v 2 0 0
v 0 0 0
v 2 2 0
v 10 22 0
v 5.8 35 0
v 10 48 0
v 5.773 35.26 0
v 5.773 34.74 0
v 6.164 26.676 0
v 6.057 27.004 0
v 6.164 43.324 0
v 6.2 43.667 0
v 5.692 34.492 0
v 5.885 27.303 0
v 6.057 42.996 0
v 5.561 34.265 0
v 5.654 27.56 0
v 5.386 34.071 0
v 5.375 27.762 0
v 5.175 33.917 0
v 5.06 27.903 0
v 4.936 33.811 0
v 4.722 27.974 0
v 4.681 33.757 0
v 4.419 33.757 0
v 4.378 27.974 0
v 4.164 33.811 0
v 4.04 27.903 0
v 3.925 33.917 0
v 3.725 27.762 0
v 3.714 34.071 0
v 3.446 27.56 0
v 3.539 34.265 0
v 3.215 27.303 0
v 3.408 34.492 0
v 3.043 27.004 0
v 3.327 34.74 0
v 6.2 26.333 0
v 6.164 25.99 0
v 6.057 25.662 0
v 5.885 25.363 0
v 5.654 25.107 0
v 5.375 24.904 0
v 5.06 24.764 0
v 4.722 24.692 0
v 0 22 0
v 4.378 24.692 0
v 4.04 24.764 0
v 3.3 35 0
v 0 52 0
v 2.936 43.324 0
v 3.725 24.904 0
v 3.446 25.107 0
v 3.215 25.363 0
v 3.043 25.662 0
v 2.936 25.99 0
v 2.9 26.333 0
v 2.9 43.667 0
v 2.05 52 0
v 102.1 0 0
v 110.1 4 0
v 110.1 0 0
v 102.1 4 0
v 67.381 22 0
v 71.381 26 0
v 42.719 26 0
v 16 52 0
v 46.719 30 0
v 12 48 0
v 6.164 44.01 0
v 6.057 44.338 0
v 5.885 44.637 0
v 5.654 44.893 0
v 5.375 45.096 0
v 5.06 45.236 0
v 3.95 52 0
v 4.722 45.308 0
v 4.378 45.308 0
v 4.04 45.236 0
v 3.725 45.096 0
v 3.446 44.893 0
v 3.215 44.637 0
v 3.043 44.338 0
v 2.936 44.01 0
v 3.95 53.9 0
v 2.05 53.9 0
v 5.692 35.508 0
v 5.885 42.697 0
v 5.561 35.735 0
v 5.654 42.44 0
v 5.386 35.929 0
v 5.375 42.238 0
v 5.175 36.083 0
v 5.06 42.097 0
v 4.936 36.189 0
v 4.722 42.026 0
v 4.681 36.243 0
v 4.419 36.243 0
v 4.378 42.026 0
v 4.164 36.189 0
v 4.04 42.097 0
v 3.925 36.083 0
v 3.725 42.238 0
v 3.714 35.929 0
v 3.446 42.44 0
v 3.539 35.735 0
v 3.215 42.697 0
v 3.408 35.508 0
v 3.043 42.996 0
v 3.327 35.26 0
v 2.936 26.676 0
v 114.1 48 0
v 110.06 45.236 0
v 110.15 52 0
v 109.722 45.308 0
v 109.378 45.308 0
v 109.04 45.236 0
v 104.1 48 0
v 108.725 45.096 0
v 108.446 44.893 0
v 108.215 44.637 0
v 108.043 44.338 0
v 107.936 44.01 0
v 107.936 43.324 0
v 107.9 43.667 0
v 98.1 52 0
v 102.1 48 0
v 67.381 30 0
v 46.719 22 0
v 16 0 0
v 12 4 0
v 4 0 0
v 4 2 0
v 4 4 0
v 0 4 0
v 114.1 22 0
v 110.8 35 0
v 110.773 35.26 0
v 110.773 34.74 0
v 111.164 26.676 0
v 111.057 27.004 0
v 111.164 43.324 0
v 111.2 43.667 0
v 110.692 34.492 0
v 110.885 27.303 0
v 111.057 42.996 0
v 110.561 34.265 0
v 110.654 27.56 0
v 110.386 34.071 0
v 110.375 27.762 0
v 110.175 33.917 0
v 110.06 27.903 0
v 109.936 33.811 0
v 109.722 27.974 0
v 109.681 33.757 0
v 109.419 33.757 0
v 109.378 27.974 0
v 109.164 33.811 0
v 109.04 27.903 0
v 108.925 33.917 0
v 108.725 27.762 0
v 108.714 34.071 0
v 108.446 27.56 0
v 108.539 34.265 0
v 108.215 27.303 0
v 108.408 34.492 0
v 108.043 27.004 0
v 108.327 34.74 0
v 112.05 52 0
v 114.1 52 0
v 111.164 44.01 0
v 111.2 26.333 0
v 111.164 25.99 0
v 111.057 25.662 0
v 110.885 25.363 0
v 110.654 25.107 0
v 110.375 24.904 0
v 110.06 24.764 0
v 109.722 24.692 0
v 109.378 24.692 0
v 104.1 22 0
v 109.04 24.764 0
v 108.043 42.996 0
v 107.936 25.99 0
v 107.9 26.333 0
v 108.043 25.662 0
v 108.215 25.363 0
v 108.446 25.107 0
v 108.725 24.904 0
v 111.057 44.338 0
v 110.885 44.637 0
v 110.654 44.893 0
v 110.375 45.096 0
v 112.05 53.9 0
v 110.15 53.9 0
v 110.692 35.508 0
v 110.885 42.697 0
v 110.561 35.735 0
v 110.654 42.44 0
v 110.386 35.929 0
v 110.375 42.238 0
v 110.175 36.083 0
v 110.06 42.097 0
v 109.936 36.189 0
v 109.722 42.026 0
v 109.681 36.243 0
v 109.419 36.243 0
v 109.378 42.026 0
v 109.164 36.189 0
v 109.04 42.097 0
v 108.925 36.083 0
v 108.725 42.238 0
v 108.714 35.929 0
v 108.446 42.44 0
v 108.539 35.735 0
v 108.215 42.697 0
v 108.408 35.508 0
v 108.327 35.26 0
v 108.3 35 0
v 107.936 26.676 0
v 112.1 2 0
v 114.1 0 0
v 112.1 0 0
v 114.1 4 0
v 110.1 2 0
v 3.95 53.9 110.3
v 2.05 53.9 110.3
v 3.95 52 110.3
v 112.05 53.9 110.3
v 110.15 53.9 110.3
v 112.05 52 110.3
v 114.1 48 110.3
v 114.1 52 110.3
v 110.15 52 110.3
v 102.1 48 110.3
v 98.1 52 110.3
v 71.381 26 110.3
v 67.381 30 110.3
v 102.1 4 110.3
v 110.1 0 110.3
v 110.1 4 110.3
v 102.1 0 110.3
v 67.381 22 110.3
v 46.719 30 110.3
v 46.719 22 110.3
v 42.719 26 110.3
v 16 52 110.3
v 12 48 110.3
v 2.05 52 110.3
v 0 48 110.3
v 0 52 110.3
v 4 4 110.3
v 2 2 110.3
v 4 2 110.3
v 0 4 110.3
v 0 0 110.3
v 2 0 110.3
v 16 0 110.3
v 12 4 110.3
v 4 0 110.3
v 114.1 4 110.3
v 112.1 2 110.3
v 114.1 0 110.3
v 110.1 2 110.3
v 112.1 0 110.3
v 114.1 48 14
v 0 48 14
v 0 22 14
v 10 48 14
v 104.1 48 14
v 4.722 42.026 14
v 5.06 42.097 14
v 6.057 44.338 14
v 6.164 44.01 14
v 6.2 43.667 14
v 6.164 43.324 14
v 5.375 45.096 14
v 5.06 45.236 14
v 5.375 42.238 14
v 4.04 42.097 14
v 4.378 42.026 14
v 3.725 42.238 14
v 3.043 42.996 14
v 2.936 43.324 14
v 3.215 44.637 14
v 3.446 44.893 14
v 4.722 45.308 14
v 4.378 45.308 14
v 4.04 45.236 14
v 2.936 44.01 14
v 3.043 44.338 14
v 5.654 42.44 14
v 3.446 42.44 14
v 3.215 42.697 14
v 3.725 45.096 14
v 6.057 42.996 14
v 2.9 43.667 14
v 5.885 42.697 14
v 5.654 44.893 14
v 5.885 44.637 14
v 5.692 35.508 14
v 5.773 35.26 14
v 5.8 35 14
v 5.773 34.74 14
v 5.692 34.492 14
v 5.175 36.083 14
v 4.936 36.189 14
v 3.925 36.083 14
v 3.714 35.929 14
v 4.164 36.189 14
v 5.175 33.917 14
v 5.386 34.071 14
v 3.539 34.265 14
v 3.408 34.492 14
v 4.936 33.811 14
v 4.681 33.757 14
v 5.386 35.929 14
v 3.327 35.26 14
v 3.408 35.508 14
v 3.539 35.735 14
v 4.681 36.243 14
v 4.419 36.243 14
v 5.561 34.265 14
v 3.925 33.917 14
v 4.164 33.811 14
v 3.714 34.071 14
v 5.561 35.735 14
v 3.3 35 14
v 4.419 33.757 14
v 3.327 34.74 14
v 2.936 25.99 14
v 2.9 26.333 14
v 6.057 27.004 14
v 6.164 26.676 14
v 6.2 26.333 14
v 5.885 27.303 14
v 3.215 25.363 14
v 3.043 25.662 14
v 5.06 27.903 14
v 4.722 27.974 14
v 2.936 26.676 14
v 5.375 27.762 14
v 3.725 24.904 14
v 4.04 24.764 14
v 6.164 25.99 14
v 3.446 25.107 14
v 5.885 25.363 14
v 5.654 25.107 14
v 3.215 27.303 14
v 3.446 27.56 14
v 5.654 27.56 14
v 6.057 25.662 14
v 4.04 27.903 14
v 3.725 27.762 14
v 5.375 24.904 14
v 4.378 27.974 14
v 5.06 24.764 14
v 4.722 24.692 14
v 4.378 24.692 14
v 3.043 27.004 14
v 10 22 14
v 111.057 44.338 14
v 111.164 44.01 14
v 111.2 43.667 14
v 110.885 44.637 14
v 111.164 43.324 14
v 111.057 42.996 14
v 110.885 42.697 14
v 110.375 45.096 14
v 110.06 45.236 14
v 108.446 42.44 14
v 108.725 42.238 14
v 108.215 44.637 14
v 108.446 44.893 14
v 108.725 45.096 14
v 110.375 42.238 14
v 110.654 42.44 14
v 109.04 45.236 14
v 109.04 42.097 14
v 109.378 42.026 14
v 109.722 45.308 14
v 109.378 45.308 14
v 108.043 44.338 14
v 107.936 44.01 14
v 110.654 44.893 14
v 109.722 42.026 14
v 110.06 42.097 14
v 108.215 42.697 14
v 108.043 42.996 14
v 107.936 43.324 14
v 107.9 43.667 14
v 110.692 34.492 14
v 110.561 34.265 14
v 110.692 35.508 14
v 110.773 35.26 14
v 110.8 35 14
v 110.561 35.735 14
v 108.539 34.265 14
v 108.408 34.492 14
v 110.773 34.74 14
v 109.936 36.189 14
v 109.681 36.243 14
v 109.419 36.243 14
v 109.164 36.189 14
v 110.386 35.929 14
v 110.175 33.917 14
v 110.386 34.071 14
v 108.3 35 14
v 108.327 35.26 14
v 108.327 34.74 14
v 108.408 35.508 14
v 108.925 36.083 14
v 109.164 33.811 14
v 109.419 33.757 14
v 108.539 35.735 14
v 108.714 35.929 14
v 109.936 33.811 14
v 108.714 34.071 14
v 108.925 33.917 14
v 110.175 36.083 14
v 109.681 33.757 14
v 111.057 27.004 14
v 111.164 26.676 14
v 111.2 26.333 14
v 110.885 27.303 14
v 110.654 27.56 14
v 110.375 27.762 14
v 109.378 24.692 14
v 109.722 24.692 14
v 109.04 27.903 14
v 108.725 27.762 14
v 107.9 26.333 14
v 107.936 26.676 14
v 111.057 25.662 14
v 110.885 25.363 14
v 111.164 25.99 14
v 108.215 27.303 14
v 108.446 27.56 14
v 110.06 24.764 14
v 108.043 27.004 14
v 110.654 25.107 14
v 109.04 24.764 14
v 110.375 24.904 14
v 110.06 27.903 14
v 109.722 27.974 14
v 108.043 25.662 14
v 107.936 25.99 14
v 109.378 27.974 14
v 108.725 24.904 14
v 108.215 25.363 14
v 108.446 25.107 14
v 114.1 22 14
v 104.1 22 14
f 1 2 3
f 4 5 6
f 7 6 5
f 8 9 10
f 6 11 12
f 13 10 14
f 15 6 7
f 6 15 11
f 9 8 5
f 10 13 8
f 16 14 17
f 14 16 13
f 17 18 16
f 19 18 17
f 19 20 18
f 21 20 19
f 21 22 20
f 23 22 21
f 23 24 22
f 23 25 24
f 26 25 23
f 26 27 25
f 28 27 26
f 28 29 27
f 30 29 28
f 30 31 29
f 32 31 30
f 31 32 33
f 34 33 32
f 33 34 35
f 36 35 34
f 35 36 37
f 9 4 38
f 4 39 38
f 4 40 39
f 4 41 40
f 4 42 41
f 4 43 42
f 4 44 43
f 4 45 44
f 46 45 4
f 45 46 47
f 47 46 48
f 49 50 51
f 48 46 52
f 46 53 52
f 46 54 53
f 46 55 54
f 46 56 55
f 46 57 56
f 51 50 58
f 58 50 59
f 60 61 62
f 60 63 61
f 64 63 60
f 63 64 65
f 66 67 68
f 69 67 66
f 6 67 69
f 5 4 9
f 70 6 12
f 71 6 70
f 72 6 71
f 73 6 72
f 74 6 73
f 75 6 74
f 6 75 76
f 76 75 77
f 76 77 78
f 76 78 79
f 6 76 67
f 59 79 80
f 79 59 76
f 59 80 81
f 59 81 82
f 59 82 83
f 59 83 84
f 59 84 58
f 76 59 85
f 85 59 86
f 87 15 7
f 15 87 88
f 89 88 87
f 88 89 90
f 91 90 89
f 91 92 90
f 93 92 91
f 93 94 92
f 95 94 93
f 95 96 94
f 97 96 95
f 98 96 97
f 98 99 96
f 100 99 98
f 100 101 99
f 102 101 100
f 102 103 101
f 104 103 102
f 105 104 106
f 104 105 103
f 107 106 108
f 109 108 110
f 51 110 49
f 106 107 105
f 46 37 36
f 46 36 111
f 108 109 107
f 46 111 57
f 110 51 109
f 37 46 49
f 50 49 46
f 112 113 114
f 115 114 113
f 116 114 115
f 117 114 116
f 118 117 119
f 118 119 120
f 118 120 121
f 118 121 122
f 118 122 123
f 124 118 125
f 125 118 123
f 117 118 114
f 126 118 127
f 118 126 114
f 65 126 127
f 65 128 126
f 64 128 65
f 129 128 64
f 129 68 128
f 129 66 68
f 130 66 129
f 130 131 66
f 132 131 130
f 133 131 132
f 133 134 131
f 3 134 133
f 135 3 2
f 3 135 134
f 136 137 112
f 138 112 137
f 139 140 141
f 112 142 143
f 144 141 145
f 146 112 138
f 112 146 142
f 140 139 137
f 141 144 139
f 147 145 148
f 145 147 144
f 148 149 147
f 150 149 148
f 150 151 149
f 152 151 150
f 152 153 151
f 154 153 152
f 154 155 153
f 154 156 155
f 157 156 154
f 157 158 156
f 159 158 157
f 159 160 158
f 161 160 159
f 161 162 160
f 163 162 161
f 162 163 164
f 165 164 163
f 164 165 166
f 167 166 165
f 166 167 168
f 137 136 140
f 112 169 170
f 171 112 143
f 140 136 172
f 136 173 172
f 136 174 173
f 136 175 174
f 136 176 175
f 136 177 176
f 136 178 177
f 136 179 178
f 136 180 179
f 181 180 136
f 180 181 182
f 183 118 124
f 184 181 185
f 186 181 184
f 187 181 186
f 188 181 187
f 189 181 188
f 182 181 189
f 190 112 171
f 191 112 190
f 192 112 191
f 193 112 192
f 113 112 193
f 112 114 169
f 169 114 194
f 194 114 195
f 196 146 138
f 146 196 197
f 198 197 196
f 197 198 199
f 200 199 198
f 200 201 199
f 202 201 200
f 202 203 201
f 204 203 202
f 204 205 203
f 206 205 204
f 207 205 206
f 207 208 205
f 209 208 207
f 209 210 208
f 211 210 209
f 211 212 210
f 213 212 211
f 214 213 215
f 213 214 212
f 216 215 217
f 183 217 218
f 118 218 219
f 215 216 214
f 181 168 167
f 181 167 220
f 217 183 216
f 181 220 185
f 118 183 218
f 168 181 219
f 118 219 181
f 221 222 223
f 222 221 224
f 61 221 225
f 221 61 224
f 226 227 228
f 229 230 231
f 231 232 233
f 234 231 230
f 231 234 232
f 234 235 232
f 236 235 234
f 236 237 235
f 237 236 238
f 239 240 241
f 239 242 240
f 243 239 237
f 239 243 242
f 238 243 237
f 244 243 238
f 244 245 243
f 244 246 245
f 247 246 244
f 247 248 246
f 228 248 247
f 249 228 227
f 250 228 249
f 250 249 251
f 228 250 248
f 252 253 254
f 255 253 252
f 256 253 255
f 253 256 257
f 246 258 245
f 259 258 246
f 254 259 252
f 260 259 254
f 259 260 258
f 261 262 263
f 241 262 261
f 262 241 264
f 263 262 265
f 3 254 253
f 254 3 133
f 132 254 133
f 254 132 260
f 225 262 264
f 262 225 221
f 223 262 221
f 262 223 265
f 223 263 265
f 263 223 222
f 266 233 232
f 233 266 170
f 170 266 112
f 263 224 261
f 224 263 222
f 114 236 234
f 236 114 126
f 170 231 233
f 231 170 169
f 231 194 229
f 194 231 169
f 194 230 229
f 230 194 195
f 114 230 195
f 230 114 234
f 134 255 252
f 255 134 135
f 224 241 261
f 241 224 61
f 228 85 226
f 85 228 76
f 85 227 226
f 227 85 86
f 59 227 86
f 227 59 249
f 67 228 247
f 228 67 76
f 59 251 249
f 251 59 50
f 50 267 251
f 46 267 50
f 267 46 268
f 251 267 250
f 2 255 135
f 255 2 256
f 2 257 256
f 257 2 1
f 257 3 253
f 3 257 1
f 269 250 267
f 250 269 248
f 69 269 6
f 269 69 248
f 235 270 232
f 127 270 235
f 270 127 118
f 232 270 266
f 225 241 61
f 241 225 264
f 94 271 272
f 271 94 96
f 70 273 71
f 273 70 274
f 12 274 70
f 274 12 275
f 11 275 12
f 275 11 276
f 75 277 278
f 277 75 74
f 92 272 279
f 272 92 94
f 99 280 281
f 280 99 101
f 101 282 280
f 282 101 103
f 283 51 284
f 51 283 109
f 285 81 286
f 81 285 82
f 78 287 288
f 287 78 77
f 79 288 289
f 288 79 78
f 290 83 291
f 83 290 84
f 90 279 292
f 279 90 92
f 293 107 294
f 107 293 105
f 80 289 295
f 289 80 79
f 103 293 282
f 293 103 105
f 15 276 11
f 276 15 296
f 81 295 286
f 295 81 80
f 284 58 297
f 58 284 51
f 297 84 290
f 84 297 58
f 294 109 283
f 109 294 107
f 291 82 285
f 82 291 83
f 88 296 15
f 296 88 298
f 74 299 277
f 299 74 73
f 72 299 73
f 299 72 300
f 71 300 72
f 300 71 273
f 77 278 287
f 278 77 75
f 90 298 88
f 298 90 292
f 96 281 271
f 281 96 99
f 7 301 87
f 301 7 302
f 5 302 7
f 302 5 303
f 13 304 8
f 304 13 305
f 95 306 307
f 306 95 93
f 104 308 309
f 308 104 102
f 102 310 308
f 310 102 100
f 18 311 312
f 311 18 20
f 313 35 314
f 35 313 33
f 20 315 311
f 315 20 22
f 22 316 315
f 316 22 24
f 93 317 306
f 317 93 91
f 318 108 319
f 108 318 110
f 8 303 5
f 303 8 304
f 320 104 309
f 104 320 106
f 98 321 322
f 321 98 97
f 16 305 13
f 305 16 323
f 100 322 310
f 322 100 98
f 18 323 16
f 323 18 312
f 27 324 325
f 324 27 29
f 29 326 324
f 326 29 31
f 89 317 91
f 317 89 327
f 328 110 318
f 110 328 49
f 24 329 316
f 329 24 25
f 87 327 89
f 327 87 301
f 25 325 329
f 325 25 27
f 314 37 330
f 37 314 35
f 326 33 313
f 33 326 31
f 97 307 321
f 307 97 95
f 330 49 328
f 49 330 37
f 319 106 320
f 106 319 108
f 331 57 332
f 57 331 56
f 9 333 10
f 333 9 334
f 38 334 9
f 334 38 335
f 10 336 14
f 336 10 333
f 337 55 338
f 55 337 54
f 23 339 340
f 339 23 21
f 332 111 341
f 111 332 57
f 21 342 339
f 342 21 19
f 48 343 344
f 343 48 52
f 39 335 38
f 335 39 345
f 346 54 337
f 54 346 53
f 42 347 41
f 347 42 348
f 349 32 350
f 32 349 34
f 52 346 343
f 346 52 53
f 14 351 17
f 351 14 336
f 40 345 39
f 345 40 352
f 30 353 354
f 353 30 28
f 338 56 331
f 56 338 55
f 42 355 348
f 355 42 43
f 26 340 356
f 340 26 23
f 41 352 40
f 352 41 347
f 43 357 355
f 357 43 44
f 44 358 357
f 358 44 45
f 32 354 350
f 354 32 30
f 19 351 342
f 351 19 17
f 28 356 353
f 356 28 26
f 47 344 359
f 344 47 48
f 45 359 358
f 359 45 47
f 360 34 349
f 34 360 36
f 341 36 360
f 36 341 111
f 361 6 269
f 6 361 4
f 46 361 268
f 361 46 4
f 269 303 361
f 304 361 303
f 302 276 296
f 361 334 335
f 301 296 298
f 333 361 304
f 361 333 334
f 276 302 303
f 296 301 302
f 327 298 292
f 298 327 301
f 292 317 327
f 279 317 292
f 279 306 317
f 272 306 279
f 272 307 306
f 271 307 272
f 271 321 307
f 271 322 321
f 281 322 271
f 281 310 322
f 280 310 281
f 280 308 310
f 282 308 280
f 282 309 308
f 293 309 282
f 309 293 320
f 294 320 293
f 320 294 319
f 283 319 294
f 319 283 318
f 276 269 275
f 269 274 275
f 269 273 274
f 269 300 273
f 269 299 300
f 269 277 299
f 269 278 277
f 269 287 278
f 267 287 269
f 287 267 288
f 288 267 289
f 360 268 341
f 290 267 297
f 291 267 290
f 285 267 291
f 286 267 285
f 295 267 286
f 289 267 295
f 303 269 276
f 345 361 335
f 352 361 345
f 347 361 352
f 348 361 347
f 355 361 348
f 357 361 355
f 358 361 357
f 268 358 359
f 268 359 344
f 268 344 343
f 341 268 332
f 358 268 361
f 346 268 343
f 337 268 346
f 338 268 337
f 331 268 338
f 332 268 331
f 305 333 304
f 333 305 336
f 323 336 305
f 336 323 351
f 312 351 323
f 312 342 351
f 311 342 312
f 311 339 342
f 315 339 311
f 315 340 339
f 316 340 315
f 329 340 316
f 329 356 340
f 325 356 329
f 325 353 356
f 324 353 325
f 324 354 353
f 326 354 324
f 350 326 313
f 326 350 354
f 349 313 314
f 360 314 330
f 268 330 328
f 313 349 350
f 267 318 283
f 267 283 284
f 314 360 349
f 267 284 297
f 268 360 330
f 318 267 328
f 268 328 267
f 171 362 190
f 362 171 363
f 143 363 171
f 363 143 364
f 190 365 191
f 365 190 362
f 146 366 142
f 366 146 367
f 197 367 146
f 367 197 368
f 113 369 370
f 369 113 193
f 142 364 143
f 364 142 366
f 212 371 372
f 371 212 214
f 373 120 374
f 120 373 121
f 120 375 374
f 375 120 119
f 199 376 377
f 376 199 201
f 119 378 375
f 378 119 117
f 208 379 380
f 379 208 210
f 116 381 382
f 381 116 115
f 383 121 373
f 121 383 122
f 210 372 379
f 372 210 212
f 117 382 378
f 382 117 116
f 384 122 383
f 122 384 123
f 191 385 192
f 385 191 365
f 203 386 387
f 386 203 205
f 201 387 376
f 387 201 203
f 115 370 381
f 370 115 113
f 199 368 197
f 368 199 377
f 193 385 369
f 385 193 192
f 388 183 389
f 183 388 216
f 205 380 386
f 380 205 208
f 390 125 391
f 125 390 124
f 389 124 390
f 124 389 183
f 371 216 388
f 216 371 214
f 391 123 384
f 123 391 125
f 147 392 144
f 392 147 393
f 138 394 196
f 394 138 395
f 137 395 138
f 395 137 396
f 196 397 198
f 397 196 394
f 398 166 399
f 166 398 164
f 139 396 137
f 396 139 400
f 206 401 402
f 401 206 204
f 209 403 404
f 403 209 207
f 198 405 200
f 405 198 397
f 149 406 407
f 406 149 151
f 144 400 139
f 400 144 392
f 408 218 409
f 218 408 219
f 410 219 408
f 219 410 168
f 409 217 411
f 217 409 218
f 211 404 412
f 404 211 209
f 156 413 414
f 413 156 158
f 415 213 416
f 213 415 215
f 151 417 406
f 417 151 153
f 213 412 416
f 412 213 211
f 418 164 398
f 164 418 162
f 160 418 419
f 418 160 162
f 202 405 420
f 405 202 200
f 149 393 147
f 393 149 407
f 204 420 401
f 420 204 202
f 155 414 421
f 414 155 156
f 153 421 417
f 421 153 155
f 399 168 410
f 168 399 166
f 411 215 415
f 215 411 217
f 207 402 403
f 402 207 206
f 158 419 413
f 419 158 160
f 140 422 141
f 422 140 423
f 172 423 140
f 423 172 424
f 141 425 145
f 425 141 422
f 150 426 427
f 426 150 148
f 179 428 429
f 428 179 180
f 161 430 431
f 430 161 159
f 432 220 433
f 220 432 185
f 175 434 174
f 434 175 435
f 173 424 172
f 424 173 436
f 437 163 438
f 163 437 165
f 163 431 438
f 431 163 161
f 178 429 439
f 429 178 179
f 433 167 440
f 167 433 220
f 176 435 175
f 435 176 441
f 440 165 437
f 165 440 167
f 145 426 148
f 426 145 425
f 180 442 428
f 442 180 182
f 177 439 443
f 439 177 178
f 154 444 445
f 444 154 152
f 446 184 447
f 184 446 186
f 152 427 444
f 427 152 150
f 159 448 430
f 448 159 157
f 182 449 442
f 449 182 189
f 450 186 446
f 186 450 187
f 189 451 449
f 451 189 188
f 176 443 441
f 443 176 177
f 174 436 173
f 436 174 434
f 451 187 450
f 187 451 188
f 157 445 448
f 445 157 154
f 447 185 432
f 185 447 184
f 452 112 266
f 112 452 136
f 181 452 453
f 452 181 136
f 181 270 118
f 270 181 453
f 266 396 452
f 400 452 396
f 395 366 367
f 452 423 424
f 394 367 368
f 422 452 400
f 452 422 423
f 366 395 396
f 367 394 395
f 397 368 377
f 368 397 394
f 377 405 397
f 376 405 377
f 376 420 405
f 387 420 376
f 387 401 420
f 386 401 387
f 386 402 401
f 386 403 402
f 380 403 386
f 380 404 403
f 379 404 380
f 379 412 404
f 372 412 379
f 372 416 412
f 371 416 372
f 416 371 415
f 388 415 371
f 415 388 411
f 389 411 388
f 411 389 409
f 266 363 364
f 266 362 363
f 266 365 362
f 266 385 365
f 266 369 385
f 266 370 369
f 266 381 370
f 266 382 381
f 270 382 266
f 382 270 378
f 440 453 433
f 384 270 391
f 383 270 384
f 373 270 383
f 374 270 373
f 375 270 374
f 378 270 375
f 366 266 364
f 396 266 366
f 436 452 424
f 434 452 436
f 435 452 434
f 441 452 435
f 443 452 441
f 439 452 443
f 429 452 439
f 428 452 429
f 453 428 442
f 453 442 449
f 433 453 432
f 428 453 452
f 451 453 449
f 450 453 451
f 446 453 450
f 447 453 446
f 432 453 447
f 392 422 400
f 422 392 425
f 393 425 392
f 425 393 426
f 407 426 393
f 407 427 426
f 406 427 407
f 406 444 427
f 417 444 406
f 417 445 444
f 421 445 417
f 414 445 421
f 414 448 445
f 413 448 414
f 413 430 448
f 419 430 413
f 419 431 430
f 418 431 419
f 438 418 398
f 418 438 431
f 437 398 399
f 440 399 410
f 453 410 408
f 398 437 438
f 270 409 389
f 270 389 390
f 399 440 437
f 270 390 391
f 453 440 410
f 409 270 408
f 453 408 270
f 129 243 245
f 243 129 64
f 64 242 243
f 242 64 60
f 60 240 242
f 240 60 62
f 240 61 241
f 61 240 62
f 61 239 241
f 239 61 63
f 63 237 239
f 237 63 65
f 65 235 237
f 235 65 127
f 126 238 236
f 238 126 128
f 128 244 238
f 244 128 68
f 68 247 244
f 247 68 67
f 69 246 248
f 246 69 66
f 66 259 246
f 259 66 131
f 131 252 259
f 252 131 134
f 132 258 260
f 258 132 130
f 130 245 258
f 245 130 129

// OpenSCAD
// file: Structures/Hexagon.scad
// created by IndiePandaaaaa | Lukas

function hexagon_get_inner_diameter(single_outer_diameter = 20) = tan(60) * (single_outer_diameter / 2);

function hexagon_inbetween_distance_x(single_outer_diameter = 20) = single_outer_diameter -
    hexagon_get_inner_diameter(single_outer_diameter);

function hexagon_get_y_inner_element_additional_height(single_outer_diameter = 20) = single_outer_diameter / 2 +
        hexagon_inbetween_distance_x(single_outer_diameter) * cos(30) + (single_outer_diameter / 2) * cos(60);

function hexagon_get_y_outer_element_height(single_outer_diameter = 20) = single_outer_diameter;

function hexagon_get_y_next_structure(single_outer_diameter = 20) = (single_outer_diameter / 2 * 3) +
            hexagon_inbetween_distance_x(single_outer_diameter) * cos(30) * 2;

function hexagon_get_y_element_height(single_outer_diameter = 20) = hexagon_get_y_outer_element_height(
single_outer_diameter) + hexagon_get_y_inner_element_additional_height(single_outer_diameter);

function hexagon_get_x_element_count(width, single_outer_diameter = 20) = floor(width / single_outer_diameter);

function hexagon_get_y_element_count(depth, single_outer_diameter = 20) = floor(((depth - (hexagon_get_y_element_height(
single_outer_diameter) -
    hexagon_get_y_next_structure(single_outer_diameter))) / hexagon_get_y_next_structure(single_outer_diameter)) * 2);

function hexagon_get_used_width(width, single_outer_diameter = 20) = single_outer_diameter *
    hexagon_get_x_element_count(width, single_outer_diameter) - hexagon_inbetween_distance_x(single_outer_diameter);

//function hexagon_get_used_depth(depth, single_outer_diameter = 20) = hexagon_get_y_next_structure(single_outer_diameter)
//    * (floor(depth / hexagon_get_y_next_structure(single_outer_diameter))) + (hexagon_inbetween_distance_x(single_outer_diameter)) * cos(30);

//function hexagon_get_used_depth(depth, single_outer_diameter = 20) = (hexagon_get_y_element_count(depth,single_outer_diameter) - 1) * 
//			hexagon_get_y_next_structure(single_outer_diameter) + hexagon_get_y_element_height(single_outer_diameter);

function hexagon_get_used_depth(depth, single_outer_diameter = 20) = round(hexagon_get_y_element_count(depth,
single_outer_diameter) / 2) * hexagon_get_y_outer_element_height(single_outer_diameter) +
        floor(hexagon_get_y_element_count(depth, single_outer_diameter) / 2) * (hexagon_get_y_next_structure(
    single_outer_diameter) - single_outer_diameter) +
            (hexagon_get_y_element_count(depth, single_outer_diameter) + 1) % 2 * (hexagon_get_y_element_height(
    single_outer_diameter) - hexagon_get_y_next_structure(single_outer_diameter));

module hexagon_pattern(width, depth, thickness, single_outer_diameter = 20, vertices = 6) {
    inner_diameter = hexagon_get_inner_diameter(single_outer_diameter);

    count_x = hexagon_get_x_element_count(width, single_outer_diameter);
    count_y = hexagon_get_y_element_count(depth, single_outer_diameter);

    angle = 360 / vertices * 1.5;

    for (y = [0:count_y - 1]) {
        for (x = [0:count_x - 1]) {

            if (y % 2 == 0) {
                translate([inner_diameter / 2 + single_outer_diameter * x, (single_outer_diameter / 2) + inner_diameter
                    * y, - 0.01]) {
                    linear_extrude(height = thickness + 0.02) {
                        rotate([0, 0, angle]) circle(d = single_outer_diameter, $fn = vertices);
                    }
                }
            } else if (x < count_x - 1 && y % 2 == 1) {
                translate([inner_diameter / 2 + single_outer_diameter * x + single_outer_diameter / 2,
                        (single_outer_diameter / 2) + inner_diameter * y, - 0.01]) {
                    linear_extrude(height = thickness + 0.02) {
                        rotate([0, 0, angle]) circle(d = single_outer_diameter, $fn = vertices);
                    }
                }
            }

        }
    }
}

width = 100;
depth = 100;
difference() {
    cube([width, depth, 3]);
    translate([(width - hexagon_get_used_width(width)) / 2, (depth - hexagon_get_used_depth(depth)) / 2, 0])
        hexagon_pattern(width, depth, 3);
}
// main file
// created by IndiePandaaaaa | Lukas

use <202304 HDD_Bay_stackable.scad>
use <Structures/Hexagon.scad>

MODEL_TOLERANCE = 0.15;
TOLERANCE_HDD = 1;

SATA_CONNECTORS = 3;
SATA_CONNECTOR_WIDTH = 16;

WITH_DIAMOND_CUTOUT = false;

SCREW_LENGTH = 12 + 2;  // additionally 2mm for less tolerance issues with threading
SCREW_SOCKET_WIDTH = 10;
FAN_CaseMountingSocket_DISTANCE = 105; // 105 mm is the distance between screws for an 120 mm fan
HDD_BOTTOM_SCREW_DEPTH = 41.3;
UBASE_THICKNESS = 4;
WIDTH_HDD = 101.5;
RUBBER_WIDTH_ADDITIONAL = 1.3;

FULLMODEL_DEPTH = SCREW_LENGTH + HDD_BOTTOM_SCREW_DEPTH + 55; // ~ 110 mm
FULLMODEL_HEIGHT = UBASE_THICKNESS + SATA_CONNECTORS * SATA_CONNECTOR_WIDTH; // ~ 53 mm height (~15mm per connector)
FULLMODEL_WIDTH = UBASE_THICKNESS * 2 + TOLERANCE_HDD * 2 + WIDTH_HDD + 2 * RUBBER_WIDTH_ADDITIONAL;

X_ANGLE = 52;

union() {
    difference() {
        UBase(FULLMODEL_DEPTH, FULLMODEL_HEIGHT, WIDTH_HDD + 2 * RUBBER_WIDTH_ADDITIONAL,
        TOLERANCE_HDD, UBASE_THICKNESS);
        translate([0, UBASE_THICKNESS, 0])
            cube([FULLMODEL_WIDTH, FULLMODEL_HEIGHT - UBASE_THICKNESS * 2, FULLMODEL_DEPTH + 1]);
        translate([UBASE_THICKNESS, 0, 0])
            cube([FULLMODEL_WIDTH - UBASE_THICKNESS * 2, FULLMODEL_HEIGHT, FULLMODEL_DEPTH + 1]);
    }

    difference() {
        slope_height = (FULLMODEL_HEIGHT - UBASE_THICKNESS) / 2;
        slope_width = tan(X_ANGLE) * slope_height;
        width_offset = 12;
        linear_extrude(FULLMODEL_DEPTH) {
            polygon([
                    [UBASE_THICKNESS, UBASE_THICKNESS],
                    [UBASE_THICKNESS, 0],
                    [UBASE_THICKNESS + width_offset, 0],
                    [UBASE_THICKNESS + width_offset + slope_width, slope_height - UBASE_THICKNESS / 2],
                    [FULLMODEL_WIDTH - width_offset - UBASE_THICKNESS - slope_width,
                        slope_height - UBASE_THICKNESS / 2],
                    [FULLMODEL_WIDTH - width_offset, 0],
                    [FULLMODEL_WIDTH - UBASE_THICKNESS, 0],
                    [FULLMODEL_WIDTH - UBASE_THICKNESS, UBASE_THICKNESS],
                    [FULLMODEL_WIDTH - width_offset, UBASE_THICKNESS],
                    [FULLMODEL_WIDTH - width_offset - slope_width, slope_height + UBASE_THICKNESS / 2],
                    [FULLMODEL_WIDTH - width_offset, FULLMODEL_HEIGHT - UBASE_THICKNESS],
                    [FULLMODEL_WIDTH, FULLMODEL_HEIGHT - UBASE_THICKNESS],
                    [FULLMODEL_WIDTH, FULLMODEL_HEIGHT],
                    [FULLMODEL_WIDTH - UBASE_THICKNESS - width_offset, FULLMODEL_HEIGHT],
                    [FULLMODEL_WIDTH - UBASE_THICKNESS - width_offset - slope_width,
                            FULLMODEL_HEIGHT - slope_height + UBASE_THICKNESS / 2],
                    [UBASE_THICKNESS + width_offset + slope_width,
                            FULLMODEL_HEIGHT - slope_height + UBASE_THICKNESS / 2],
                    [width_offset + UBASE_THICKNESS, FULLMODEL_HEIGHT],
                    [0, FULLMODEL_HEIGHT],
                    [0, FULLMODEL_HEIGHT - UBASE_THICKNESS],
                    [width_offset, FULLMODEL_HEIGHT - UBASE_THICKNESS],
                    [width_offset + slope_width, slope_height + UBASE_THICKNESS / 2],
                    [width_offset, UBASE_THICKNESS],
                ]);
        }

        if (WITH_DIAMOND_CUTOUT) {
            translate([0, FULLMODEL_HEIGHT, 0]) rotate([90, 0, 0]) {
                linear_extrude(FULLMODEL_HEIGHT) {
                    middle_width = (FULLMODEL_WIDTH - width_offset - UBASE_THICKNESS) -
                        (UBASE_THICKNESS + width_offset + slope_width);
                    polygon([
                            [UBASE_THICKNESS + width_offset + UBASE_THICKNESS, width_offset * 2],
                            [UBASE_THICKNESS + width_offset + slope_width / 2, UBASE_THICKNESS * 2],
                            [UBASE_THICKNESS + width_offset + slope_width - UBASE_THICKNESS, width_offset * 2],
                            [UBASE_THICKNESS + width_offset + slope_width - UBASE_THICKNESS,
                                FULLMODEL_DEPTH - width_offset * 2],
                            [UBASE_THICKNESS + width_offset + slope_width / 2, FULLMODEL_DEPTH - UBASE_THICKNESS * 2],
                            [UBASE_THICKNESS + width_offset + UBASE_THICKNESS, FULLMODEL_DEPTH - width_offset * 2],
                        ]);
                    polygon([
                            [UBASE_THICKNESS + middle_width + width_offset + UBASE_THICKNESS, width_offset * 2],
                            [UBASE_THICKNESS + middle_width + width_offset + slope_width / 2, UBASE_THICKNESS * 2],
                            [UBASE_THICKNESS + middle_width + width_offset + slope_width - UBASE_THICKNESS,
                                width_offset * 2],
                            [UBASE_THICKNESS + middle_width + width_offset + slope_width - UBASE_THICKNESS,
                                FULLMODEL_DEPTH - width_offset * 2],
                            [UBASE_THICKNESS + middle_width + width_offset + slope_width / 2,
                                FULLMODEL_DEPTH - UBASE_THICKNESS * 2],
                            [UBASE_THICKNESS + middle_width + width_offset + UBASE_THICKNESS,
                                FULLMODEL_DEPTH - width_offset * 2],
                        ]);
                }
            }
        }
    }
    translate([0, FULLMODEL_HEIGHT - UBASE_THICKNESS, 0]) rotate([90, 0, 0])
        CaseMountingSocket(SCREW_SOCKET_WIDTH, SCREW_LENGTH, FULLMODEL_HEIGHT / 2, FAN_CaseMountingSocket_DISTANCE,
        FULLMODEL_WIDTH, for_cutout_only = false);
}
